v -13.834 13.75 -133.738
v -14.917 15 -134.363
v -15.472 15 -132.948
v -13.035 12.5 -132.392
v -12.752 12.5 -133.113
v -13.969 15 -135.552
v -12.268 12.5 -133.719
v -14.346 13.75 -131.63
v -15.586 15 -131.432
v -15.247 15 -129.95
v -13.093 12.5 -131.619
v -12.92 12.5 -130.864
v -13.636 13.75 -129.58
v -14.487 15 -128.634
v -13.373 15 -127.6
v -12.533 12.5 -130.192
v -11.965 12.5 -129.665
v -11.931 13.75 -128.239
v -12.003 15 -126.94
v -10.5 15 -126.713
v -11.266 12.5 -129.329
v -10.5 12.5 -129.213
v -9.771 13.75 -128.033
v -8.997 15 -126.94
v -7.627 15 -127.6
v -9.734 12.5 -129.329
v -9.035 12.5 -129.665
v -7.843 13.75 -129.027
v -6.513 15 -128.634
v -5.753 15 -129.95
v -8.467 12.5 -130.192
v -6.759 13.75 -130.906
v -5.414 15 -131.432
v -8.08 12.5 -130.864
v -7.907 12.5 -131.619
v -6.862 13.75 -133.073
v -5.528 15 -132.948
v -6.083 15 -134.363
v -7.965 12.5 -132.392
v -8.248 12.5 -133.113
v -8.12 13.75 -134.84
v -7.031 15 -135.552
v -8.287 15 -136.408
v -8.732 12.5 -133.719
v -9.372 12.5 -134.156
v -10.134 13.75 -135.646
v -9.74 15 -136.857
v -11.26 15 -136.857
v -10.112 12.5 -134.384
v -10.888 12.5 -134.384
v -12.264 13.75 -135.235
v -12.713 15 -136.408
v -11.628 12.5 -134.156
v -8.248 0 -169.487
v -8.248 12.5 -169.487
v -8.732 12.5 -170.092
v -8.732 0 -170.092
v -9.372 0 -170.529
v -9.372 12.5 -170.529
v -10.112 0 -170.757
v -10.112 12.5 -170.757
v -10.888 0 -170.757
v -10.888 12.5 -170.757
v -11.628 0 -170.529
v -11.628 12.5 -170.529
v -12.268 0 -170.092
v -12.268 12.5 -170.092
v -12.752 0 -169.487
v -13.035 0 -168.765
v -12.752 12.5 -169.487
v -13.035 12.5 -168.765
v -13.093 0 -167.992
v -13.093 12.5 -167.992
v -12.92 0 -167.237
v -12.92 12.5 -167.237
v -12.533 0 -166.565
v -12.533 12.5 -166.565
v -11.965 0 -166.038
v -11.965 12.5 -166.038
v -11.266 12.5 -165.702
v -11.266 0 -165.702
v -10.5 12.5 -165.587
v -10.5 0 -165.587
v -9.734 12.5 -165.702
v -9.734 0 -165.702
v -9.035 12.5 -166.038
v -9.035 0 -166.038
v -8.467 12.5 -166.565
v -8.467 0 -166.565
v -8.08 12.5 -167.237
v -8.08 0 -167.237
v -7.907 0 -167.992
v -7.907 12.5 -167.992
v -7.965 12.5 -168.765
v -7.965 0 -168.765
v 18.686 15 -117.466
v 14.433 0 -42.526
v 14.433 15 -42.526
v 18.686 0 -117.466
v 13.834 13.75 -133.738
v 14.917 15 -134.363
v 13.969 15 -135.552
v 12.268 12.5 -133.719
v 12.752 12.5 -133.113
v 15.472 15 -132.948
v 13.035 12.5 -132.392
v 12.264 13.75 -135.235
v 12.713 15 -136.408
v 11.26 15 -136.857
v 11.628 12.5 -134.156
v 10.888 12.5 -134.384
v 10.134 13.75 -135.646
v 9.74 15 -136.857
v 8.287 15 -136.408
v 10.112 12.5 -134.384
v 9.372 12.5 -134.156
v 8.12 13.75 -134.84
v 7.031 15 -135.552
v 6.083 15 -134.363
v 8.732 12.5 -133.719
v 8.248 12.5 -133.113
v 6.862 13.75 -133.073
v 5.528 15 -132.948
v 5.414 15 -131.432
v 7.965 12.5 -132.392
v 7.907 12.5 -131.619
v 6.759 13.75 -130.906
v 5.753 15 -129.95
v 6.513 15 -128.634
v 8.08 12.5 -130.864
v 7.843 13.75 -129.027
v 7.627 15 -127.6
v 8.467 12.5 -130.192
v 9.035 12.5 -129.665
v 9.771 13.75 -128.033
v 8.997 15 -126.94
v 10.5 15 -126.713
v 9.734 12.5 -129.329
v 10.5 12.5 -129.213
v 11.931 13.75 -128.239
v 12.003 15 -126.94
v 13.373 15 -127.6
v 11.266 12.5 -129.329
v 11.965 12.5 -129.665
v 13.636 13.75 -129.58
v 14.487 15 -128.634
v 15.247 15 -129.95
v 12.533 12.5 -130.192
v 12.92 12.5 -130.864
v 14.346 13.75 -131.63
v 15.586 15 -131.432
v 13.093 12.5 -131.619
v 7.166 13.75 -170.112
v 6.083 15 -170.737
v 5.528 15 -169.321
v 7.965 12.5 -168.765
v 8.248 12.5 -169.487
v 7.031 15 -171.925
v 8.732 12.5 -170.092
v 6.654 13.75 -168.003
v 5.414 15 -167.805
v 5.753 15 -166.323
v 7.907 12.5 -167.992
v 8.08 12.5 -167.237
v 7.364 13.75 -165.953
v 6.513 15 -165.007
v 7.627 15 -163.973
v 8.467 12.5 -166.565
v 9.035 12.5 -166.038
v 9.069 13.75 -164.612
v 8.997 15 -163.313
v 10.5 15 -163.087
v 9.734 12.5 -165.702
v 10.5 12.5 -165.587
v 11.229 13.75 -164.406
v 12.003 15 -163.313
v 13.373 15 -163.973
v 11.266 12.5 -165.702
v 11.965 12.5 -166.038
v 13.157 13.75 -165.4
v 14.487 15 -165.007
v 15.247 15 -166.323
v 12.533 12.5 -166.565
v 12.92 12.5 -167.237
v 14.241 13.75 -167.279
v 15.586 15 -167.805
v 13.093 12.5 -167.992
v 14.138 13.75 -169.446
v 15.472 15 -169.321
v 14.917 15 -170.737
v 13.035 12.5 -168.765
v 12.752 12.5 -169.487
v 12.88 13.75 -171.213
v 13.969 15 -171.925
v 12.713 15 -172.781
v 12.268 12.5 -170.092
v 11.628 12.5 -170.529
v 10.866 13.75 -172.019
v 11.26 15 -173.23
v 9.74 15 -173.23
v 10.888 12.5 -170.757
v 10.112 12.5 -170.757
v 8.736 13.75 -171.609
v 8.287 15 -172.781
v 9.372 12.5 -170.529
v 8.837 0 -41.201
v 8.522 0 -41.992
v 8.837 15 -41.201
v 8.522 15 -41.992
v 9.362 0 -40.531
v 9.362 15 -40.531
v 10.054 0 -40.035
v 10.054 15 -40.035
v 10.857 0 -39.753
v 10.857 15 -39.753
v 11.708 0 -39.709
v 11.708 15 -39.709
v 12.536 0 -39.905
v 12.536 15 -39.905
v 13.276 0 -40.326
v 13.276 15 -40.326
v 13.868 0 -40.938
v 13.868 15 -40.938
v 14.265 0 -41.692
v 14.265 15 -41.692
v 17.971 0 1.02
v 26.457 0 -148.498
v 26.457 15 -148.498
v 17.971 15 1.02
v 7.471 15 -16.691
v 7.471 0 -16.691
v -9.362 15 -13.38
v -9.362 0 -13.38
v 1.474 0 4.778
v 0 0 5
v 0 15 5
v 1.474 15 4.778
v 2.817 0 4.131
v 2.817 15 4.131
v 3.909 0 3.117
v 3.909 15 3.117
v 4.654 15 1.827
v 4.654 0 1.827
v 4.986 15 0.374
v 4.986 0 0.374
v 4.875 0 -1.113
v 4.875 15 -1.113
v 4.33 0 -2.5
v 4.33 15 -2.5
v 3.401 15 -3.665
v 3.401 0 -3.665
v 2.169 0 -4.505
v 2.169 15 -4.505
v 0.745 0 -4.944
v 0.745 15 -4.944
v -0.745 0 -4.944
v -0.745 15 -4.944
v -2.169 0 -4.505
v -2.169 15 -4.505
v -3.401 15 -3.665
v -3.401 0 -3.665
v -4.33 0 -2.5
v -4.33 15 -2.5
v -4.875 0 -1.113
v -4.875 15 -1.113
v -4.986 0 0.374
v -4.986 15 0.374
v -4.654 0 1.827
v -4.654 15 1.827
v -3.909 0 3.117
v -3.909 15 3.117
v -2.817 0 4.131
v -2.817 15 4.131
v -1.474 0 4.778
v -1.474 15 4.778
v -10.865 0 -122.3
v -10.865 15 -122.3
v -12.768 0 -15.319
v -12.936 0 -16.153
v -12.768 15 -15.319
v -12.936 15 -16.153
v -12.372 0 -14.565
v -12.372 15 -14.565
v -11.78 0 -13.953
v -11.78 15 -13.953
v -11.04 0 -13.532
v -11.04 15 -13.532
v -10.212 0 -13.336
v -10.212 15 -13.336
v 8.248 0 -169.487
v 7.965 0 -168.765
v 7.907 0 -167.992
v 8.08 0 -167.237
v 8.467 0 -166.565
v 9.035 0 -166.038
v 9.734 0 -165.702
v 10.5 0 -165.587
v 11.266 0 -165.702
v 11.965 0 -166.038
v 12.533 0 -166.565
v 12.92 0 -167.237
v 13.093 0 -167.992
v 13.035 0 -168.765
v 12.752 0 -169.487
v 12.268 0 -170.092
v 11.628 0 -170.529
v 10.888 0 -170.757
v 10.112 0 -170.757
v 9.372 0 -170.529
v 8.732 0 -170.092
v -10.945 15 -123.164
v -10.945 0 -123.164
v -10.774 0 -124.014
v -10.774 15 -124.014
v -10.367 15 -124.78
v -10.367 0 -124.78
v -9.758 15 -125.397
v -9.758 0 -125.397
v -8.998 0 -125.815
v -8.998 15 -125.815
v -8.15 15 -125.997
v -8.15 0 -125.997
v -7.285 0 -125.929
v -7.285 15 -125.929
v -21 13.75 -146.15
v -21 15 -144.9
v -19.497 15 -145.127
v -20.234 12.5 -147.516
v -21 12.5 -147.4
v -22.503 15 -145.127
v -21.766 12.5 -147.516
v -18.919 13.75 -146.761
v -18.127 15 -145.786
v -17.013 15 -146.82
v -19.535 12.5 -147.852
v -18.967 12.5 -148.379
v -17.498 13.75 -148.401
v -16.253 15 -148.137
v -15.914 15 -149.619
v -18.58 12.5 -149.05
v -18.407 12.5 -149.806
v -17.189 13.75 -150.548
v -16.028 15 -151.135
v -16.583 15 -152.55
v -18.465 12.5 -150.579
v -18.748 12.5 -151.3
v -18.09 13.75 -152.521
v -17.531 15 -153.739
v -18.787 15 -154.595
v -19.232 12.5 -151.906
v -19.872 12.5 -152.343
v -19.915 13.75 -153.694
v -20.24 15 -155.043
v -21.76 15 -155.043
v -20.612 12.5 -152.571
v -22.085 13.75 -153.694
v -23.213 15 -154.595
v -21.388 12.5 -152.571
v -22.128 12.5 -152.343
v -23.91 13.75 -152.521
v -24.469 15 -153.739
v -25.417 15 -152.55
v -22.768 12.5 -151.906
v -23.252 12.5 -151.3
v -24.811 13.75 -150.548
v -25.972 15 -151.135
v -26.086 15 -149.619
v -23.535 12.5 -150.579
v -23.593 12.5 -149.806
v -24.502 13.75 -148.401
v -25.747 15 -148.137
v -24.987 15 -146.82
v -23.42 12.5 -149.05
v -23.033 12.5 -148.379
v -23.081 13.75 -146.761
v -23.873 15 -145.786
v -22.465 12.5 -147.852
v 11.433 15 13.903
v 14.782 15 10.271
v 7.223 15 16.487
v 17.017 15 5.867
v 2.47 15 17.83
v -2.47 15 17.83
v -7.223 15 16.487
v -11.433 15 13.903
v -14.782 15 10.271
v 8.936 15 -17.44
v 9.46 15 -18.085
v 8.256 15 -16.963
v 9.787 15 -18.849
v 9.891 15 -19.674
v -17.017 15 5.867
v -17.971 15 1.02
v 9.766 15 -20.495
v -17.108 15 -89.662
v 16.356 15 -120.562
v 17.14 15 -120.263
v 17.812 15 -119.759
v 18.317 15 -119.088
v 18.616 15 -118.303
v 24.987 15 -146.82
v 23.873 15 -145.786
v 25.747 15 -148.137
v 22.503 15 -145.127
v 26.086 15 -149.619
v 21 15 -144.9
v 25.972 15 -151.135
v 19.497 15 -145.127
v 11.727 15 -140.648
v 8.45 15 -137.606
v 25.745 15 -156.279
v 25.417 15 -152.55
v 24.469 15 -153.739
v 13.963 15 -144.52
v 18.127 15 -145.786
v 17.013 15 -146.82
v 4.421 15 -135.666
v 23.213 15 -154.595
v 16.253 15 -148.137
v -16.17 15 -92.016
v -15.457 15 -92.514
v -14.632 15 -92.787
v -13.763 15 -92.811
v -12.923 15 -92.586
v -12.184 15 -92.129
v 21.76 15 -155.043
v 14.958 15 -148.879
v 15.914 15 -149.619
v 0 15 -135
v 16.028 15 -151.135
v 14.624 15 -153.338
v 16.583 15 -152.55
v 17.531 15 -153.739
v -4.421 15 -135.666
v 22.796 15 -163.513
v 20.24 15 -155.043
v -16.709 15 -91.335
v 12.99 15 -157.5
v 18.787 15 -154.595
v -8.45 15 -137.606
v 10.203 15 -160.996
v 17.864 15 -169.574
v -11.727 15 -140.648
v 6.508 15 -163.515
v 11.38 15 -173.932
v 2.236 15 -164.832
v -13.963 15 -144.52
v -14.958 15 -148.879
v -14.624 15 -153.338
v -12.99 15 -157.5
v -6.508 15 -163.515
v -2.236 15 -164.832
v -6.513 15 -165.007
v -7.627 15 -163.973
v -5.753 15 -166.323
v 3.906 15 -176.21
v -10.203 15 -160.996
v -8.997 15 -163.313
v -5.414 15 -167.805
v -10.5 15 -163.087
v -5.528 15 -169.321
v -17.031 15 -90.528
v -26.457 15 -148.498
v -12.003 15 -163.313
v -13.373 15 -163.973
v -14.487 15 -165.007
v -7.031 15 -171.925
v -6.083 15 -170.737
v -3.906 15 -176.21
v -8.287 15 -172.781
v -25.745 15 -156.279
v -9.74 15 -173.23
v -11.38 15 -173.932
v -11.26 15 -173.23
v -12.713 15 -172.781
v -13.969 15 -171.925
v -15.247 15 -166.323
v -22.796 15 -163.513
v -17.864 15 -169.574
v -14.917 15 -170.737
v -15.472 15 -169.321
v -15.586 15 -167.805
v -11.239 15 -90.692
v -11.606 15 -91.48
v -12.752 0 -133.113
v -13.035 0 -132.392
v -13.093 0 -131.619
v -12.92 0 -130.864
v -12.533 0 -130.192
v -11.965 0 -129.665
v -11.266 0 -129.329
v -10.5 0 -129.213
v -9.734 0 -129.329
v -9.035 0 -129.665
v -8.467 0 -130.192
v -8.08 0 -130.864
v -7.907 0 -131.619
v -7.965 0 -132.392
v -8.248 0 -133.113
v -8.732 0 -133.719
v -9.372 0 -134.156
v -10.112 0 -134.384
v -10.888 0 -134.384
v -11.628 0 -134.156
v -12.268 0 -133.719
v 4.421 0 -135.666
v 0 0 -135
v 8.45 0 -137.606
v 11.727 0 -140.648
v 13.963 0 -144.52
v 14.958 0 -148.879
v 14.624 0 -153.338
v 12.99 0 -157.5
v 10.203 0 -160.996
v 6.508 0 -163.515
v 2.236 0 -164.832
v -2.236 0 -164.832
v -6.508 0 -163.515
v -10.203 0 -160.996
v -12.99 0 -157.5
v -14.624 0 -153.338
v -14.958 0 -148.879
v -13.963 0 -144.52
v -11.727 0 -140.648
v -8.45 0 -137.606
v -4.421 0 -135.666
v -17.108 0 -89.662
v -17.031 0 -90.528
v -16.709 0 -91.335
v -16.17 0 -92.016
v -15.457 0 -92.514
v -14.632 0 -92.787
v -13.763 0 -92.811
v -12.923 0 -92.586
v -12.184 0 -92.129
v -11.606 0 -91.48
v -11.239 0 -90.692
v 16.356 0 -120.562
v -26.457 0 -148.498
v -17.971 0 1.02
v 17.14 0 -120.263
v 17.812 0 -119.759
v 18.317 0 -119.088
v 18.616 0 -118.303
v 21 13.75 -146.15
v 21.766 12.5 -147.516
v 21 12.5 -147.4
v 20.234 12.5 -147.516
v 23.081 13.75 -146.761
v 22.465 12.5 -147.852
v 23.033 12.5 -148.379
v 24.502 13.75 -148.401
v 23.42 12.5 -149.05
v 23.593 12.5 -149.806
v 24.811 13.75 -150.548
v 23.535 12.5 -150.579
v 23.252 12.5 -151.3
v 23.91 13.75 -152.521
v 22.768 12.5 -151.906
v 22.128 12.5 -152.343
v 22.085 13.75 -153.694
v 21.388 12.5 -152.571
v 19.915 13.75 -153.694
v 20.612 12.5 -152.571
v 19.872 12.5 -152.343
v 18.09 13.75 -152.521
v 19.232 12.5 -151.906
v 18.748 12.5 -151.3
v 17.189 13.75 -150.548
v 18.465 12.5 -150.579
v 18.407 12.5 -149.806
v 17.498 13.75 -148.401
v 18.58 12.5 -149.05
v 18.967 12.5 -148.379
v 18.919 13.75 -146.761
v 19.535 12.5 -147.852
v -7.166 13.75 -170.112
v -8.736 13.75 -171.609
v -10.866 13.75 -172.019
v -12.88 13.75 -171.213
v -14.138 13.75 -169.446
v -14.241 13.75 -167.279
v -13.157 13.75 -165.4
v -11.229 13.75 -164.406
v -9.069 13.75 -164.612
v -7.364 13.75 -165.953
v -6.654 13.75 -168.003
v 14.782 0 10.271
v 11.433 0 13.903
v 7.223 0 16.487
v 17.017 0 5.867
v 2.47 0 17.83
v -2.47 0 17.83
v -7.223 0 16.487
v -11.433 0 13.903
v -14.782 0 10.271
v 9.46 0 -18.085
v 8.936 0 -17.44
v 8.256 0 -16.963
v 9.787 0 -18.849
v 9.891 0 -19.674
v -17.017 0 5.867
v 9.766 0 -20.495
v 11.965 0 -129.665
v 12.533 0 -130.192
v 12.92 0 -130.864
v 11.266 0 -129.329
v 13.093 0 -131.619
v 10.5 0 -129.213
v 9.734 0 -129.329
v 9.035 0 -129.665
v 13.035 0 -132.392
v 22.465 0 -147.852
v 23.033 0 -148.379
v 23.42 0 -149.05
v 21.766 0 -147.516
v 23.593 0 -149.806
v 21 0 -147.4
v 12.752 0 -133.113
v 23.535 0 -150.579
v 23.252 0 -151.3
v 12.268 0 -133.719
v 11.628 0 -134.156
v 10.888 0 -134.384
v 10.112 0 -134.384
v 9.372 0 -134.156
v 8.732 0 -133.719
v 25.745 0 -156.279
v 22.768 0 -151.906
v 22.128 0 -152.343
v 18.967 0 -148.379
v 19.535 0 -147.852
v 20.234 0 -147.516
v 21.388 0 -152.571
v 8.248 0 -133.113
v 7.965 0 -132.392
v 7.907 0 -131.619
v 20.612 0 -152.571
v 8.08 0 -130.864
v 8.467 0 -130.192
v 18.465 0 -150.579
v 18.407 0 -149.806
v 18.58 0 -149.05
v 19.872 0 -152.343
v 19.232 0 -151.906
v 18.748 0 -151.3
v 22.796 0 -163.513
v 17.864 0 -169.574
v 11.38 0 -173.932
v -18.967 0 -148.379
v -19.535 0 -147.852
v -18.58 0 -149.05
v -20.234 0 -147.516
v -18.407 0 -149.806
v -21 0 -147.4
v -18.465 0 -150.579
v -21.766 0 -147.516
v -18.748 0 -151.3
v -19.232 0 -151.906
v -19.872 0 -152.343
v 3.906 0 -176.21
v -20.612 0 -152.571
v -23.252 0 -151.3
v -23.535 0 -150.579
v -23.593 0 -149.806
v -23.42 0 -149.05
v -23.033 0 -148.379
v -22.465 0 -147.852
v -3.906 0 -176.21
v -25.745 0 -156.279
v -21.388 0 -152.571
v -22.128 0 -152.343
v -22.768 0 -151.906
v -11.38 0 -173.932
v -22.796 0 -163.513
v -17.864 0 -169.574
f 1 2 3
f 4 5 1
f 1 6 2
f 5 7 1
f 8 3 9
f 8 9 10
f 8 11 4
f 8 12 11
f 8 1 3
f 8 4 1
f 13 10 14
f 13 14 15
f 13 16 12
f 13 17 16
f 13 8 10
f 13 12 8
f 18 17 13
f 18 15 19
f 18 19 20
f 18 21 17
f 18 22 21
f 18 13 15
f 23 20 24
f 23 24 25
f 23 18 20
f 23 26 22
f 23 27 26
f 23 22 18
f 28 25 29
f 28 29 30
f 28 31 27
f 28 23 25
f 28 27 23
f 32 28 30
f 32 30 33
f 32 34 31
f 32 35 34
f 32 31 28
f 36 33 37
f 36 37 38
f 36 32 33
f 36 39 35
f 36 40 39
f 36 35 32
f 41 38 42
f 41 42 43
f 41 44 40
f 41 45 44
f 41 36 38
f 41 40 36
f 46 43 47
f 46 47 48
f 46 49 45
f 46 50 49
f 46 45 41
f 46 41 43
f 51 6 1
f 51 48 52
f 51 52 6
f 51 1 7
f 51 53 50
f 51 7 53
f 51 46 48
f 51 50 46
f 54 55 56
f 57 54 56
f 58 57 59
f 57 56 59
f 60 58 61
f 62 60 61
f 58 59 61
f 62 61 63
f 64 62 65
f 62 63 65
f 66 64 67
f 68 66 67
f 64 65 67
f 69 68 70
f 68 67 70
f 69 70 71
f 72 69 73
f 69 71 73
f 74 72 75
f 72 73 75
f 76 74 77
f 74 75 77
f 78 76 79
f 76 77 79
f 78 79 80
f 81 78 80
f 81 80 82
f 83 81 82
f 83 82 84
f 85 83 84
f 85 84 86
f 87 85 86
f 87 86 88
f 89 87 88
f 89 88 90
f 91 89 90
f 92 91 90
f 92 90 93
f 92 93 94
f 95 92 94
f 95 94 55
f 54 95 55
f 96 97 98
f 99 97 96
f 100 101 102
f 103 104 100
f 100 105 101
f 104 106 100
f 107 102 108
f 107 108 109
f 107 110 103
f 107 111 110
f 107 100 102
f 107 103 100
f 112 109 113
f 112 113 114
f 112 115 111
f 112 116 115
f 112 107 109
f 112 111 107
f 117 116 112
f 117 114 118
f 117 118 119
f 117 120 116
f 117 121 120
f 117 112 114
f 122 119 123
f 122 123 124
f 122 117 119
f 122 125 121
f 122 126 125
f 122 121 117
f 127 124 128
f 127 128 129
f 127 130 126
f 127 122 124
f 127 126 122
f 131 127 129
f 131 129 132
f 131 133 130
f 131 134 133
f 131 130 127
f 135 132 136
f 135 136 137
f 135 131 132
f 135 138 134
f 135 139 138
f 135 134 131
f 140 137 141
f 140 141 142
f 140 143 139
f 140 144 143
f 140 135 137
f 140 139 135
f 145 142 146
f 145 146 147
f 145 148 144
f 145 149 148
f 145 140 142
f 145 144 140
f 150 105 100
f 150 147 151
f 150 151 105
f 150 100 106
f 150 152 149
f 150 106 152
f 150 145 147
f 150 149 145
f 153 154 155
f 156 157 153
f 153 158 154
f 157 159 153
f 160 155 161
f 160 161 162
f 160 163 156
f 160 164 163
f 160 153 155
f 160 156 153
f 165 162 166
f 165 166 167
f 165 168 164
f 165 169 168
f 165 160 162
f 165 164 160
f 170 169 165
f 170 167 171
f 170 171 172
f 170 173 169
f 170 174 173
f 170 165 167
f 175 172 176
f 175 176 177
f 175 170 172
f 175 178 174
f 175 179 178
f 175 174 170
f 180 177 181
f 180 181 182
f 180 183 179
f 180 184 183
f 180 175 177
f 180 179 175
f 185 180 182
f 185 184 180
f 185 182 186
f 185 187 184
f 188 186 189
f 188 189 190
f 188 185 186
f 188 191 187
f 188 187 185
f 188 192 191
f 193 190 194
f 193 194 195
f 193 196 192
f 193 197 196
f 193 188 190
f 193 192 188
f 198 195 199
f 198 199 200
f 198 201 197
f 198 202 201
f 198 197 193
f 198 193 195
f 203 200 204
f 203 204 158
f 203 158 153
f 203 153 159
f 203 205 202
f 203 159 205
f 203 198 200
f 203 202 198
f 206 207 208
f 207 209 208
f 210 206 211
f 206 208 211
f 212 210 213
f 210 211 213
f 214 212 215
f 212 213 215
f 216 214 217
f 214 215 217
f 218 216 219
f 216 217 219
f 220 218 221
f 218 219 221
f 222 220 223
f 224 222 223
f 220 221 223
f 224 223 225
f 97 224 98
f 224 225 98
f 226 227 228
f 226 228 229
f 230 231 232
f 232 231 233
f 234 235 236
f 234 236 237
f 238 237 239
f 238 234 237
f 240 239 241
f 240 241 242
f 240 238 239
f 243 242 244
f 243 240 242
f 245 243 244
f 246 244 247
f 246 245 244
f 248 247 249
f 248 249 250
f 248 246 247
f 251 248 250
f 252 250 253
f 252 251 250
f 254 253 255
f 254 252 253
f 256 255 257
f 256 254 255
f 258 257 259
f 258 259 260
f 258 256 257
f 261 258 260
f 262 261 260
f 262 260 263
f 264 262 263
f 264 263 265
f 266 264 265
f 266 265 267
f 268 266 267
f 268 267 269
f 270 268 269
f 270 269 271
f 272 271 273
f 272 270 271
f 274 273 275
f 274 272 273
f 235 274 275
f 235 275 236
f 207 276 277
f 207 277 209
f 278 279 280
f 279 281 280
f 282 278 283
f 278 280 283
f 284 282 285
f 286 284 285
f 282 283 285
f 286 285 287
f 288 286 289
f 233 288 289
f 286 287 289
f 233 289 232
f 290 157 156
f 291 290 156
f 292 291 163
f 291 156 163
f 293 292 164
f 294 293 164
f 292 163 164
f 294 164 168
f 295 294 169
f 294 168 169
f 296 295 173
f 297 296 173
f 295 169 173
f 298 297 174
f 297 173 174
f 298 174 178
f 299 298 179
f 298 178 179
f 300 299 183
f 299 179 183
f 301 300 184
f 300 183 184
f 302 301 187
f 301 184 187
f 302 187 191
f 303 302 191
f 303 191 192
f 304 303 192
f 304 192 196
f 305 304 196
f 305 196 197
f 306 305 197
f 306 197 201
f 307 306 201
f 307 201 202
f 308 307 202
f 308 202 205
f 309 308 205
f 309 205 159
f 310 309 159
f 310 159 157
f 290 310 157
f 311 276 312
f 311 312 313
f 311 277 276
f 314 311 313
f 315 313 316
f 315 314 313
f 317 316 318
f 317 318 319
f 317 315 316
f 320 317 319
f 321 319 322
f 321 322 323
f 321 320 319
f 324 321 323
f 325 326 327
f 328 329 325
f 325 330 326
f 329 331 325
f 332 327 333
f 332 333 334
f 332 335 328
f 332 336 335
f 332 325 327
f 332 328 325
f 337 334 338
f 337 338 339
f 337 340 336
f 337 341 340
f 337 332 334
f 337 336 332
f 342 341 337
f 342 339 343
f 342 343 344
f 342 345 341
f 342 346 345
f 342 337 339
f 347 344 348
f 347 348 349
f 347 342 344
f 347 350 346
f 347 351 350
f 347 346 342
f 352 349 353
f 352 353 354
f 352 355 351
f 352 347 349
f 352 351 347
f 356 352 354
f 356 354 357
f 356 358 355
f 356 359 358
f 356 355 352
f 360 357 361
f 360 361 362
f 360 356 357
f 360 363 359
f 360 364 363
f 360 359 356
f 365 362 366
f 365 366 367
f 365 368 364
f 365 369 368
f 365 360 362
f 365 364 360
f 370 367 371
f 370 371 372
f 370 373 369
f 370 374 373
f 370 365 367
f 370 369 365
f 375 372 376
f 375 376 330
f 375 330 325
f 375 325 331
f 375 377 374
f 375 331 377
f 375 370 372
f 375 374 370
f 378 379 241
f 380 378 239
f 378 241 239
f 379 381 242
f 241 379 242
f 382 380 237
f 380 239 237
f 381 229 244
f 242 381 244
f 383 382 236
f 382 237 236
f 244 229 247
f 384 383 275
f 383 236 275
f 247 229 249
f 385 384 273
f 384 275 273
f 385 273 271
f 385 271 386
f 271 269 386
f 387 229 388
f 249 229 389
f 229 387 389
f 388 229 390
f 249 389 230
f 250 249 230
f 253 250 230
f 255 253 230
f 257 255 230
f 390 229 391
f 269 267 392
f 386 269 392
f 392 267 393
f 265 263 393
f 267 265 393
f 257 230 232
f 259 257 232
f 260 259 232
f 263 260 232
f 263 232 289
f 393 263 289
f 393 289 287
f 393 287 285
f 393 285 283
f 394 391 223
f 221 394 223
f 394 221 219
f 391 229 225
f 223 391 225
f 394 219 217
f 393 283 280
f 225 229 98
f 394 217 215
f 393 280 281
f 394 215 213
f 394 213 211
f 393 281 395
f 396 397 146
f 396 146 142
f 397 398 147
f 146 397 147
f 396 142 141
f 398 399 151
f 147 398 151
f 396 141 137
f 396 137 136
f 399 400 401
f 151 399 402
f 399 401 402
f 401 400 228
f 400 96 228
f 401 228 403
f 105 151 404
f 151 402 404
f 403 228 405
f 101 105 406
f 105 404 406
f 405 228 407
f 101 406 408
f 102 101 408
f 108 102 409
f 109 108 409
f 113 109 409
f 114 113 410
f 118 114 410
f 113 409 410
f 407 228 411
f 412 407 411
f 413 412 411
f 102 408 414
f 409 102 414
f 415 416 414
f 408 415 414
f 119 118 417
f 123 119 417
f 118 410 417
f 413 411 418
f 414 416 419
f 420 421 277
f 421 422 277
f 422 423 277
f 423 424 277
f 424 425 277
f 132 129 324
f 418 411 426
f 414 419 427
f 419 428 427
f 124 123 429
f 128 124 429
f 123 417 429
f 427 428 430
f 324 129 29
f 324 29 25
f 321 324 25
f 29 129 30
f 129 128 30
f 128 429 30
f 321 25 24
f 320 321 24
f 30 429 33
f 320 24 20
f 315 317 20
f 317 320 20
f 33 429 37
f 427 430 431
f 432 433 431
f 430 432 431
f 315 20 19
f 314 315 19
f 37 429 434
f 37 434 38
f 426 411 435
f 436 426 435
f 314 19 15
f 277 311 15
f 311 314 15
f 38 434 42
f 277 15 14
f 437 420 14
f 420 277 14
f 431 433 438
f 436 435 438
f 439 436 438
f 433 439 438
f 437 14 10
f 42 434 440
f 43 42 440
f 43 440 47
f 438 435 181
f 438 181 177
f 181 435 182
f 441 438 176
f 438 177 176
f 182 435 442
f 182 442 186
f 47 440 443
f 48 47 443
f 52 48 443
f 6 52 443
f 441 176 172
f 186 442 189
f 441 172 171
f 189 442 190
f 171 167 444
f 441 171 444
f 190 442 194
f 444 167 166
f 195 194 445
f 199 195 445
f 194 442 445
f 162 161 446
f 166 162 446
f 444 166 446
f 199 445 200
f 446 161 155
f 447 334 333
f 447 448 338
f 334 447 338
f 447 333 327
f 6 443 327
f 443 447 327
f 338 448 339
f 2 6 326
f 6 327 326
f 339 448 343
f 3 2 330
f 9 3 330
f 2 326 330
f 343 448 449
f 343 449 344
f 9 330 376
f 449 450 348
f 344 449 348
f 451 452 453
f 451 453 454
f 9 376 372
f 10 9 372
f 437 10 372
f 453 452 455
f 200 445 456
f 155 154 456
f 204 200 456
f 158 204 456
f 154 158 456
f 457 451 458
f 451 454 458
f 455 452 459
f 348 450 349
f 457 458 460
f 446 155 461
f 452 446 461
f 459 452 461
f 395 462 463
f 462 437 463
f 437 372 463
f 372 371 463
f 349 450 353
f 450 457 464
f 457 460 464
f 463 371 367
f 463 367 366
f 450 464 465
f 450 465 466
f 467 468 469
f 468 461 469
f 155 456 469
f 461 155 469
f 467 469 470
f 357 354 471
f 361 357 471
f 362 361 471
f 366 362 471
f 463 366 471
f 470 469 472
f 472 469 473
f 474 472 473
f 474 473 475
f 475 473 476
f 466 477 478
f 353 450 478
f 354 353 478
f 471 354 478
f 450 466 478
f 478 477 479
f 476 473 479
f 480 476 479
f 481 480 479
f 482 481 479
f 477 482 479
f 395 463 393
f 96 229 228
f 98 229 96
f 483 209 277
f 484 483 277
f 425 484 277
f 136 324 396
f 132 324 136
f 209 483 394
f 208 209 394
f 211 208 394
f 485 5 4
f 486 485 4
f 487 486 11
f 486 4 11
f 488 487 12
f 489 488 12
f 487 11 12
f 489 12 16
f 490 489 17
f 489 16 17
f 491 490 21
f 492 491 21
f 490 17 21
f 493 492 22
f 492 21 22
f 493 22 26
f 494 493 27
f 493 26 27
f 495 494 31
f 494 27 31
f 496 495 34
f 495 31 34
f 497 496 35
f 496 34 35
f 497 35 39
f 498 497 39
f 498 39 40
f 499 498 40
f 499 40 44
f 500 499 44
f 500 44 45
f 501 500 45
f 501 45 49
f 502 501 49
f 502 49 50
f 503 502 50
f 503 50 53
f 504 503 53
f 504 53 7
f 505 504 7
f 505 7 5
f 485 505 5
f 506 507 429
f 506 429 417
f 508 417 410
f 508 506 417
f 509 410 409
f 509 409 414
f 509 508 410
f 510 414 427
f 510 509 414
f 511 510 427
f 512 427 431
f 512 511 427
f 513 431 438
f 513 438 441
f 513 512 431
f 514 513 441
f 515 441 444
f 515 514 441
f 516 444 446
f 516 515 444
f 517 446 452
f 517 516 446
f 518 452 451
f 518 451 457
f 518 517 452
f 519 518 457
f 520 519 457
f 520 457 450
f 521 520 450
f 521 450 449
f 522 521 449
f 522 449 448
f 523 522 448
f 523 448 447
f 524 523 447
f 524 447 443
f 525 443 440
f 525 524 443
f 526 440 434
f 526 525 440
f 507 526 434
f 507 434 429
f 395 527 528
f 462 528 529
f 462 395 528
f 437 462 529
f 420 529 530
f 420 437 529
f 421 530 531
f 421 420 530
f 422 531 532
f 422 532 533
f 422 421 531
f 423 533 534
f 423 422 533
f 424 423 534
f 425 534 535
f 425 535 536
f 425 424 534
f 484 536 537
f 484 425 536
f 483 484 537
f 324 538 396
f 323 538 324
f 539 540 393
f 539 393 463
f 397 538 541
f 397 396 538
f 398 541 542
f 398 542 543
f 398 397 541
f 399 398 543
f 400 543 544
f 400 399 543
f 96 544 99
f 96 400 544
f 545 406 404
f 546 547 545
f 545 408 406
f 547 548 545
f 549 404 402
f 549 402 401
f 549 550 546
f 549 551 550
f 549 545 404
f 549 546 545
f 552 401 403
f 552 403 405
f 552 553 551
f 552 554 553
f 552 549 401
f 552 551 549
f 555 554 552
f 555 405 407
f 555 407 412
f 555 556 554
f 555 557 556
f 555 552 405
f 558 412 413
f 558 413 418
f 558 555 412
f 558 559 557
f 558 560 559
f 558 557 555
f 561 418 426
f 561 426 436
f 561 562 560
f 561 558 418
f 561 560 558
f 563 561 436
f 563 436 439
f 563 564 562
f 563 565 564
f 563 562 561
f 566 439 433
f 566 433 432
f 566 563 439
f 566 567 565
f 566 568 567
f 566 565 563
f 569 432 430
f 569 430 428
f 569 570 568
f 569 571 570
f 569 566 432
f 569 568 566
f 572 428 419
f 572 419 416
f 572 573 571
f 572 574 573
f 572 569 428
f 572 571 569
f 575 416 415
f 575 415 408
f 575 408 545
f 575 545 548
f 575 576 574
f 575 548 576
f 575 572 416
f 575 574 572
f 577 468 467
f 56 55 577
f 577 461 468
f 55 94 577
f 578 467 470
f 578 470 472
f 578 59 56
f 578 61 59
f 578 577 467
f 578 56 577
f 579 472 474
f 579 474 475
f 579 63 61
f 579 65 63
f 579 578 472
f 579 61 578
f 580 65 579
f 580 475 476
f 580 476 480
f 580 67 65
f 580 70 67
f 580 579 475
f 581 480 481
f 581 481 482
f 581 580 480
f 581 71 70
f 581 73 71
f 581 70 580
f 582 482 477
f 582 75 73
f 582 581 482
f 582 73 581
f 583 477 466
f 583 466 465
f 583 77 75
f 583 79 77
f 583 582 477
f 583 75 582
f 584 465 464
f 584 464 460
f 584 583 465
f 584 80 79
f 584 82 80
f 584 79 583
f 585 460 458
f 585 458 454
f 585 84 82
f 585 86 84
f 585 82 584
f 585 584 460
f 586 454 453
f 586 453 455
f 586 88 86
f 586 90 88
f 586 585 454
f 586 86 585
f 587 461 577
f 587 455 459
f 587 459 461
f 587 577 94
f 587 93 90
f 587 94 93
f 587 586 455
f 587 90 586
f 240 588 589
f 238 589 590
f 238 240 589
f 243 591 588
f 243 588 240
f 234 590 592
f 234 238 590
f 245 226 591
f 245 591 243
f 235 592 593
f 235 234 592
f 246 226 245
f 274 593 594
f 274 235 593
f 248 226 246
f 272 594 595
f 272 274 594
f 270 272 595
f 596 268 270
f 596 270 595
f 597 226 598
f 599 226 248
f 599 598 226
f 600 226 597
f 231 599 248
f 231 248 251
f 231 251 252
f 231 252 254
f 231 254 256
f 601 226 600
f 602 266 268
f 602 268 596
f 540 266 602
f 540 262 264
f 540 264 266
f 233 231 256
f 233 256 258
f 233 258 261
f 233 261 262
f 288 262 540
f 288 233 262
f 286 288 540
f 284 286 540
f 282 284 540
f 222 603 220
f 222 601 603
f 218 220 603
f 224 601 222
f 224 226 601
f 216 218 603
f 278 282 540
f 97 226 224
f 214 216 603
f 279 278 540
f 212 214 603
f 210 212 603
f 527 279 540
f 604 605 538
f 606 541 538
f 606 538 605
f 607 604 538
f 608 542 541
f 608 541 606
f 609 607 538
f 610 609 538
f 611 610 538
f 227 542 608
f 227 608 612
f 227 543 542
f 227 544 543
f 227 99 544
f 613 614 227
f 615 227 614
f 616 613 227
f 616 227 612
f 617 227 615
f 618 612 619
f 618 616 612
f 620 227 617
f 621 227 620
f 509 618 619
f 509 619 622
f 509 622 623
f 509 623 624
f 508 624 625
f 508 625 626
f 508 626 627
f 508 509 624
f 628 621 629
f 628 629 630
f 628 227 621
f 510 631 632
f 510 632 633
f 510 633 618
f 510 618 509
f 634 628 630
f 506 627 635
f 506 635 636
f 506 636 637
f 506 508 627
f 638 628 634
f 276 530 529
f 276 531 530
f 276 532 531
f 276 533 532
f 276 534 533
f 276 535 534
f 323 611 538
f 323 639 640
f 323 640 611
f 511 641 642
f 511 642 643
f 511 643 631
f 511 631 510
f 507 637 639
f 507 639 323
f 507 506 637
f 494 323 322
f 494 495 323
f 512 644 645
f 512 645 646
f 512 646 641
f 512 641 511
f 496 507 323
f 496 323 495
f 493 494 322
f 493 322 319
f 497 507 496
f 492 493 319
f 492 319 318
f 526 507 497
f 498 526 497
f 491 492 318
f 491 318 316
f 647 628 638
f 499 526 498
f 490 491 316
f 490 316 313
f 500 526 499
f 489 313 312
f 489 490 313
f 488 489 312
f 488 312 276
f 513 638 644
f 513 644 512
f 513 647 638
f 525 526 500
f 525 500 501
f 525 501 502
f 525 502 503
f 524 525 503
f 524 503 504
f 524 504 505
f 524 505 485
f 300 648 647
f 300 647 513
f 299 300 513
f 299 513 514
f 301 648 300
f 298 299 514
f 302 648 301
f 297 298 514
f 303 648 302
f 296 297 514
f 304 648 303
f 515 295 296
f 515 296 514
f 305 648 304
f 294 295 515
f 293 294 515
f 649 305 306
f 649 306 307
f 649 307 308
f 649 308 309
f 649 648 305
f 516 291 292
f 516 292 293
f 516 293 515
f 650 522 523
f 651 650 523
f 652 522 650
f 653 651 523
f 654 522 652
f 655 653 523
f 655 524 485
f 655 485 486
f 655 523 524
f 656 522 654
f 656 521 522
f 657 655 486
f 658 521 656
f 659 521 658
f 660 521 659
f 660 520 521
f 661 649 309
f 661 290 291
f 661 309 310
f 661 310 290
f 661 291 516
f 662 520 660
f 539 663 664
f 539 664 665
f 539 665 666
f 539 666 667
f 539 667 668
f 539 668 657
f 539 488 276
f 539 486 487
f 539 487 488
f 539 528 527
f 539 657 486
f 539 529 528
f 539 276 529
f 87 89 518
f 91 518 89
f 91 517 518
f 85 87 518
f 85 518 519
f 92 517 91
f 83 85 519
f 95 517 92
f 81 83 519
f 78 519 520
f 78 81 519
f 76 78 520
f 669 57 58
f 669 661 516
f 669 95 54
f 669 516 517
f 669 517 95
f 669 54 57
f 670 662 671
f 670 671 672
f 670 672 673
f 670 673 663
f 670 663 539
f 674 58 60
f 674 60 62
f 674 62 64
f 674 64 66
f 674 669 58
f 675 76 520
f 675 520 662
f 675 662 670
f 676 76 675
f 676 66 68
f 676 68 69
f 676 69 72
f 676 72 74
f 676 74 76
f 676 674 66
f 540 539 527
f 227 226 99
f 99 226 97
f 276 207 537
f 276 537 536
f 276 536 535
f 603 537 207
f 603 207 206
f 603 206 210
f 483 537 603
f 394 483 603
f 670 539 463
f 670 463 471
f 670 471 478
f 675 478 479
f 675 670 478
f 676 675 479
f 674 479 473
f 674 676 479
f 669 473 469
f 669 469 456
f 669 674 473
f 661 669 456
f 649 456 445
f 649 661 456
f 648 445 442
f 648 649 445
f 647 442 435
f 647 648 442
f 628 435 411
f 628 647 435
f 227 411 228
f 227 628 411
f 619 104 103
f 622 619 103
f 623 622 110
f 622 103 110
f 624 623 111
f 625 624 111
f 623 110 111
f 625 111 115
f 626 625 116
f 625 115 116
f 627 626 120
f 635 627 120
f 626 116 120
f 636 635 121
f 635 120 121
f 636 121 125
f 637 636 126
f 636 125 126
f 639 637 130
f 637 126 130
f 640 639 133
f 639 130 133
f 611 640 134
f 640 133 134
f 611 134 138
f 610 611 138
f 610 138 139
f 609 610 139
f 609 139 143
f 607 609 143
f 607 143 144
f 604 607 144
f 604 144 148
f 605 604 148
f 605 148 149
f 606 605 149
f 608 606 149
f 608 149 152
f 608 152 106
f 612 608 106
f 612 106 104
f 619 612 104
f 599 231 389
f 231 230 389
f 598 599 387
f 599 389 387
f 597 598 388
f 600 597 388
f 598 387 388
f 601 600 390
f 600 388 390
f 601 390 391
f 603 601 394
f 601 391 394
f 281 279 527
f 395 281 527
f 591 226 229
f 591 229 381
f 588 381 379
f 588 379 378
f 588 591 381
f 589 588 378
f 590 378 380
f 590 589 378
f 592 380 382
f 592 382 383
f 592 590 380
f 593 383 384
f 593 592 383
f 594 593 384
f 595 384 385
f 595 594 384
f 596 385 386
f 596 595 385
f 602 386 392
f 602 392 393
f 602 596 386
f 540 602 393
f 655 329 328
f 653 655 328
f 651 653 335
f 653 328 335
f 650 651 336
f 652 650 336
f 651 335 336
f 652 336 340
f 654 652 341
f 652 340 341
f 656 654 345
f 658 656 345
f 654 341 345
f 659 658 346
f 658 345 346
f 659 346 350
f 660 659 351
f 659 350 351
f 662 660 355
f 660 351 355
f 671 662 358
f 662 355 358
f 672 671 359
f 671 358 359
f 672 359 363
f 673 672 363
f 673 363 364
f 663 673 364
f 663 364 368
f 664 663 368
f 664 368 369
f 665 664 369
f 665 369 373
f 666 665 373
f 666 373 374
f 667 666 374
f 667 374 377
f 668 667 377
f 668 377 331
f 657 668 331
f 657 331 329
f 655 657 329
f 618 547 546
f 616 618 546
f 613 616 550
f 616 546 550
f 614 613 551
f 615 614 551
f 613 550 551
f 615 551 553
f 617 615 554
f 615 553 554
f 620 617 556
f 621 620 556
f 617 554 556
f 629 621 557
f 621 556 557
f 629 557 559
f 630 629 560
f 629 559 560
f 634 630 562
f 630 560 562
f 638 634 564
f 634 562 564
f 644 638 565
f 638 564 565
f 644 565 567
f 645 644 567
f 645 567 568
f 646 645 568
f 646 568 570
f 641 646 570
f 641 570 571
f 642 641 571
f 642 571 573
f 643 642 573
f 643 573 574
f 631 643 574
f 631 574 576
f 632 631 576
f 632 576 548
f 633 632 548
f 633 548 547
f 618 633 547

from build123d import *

# Parameters (mm, degrees)
SKETCH_1_R               = 5
SKETCH_1_R_2             = 15
EXTRUDE_1_DEPTH          = 15
FILLET_1_R               = 3
SKETCH_2_R               = 2.6
CUT_EXTRUDE_1_DEPTH      = 180.107509614
PATTERN_CIRCULAR_5_COUNT = 3
CHAMFER_1_SIZE           = 2.5


with BuildPart() as part:
    # 草图1 → 凸台-拉伸1 (new body)
    with BuildSketch(Plane(origin=(0, 0, 0), x_dir=(1, 0, 0), z_dir=(0, 1, 0))):
        with BuildLine():
            Line((-17.971076762, -1.02), (-26.457418567, 148.498333333))
            ThreePointArc((-26.457418567, 148.498333333), (0, 176.5), (26.457418567, 148.498333333))
            Line((26.457418567, 148.498333333), (17.971076762, -1.02))
            ThreePointArc((17.971076762, -1.02), (0, -18), (-17.971076762, -1.02))
        make_face()
        with Locations(Location((0, 0, 0), (0, 0, 270))):
            Circle(SKETCH_1_R, mode=Mode.SUBTRACT)
        with Locations(Location((0, 150, 0), (0, 0, 270))):
            Circle(SKETCH_1_R_2, mode=Mode.SUBTRACT)
        Polygon((-12.740980954, 12.714849757), (-18.554385191, 115.139490738), (10.712851955, 17.329399023), align=None, mode=Mode.SUBTRACT)
        Polygon((13.283215706, 22.268322657), (18.830257334, 120), (-12, 127), align=None, mode=Mode.SUBTRACT)
    extrude(amount=EXTRUDE_1_DEPTH)

    # 圆角1
    fillet_1_edges = [part.edges().sort_by_distance(p)[0] for p in [
        (-12.740980954, 7.5, -12.714849757),
        (10.712851955, 7.5, -17.329399023),
        (-18.554385191, 7.5, -115.139490738),
        (18.830257334, 7.5, -120),
        (-12, 7.5, -127),
        (13.283215706, 7.5, -22.268322657),
    ]]
    fillet(fillet_1_edges, radius=FILLET_1_R)

    # 草图2 → 切除-拉伸1 (cut, through all)
    with BuildSketch(Plane(origin=(0, 15, 0), x_dir=(1, 0, 0), z_dir=(0, 1, 0))):
        with Locations(Location((-21, 150, 0), (0, 0, 270))):
            Circle(SKETCH_2_R)
        with Locations(Location((21, 150, 0), (0, 0, 270))):
            Circle(SKETCH_2_R)
    cut_extrude_1 = extrude(amount=-CUT_EXTRUDE_1_DEPTH, mode=Mode.SUBTRACT)

    # 阵列(圆周)5: 切除-拉伸1 ×3 about axis
    pattern_circular_5_axis = Axis((0, 0, -150), (0, 1, 0))
    for i in range(1, PATTERN_CIRCULAR_5_COUNT):
        add(cut_extrude_1.rotate(pattern_circular_5_axis, i * 360 / PATTERN_CIRCULAR_5_COUNT), mode=Mode.SUBTRACT)

    # 倒角1
    chamfer_1_edges = [part.edges().sort_by_distance(p)[0] for p in [
        (-12.75166605, 15, -166.886533479),
        (-8.24833395, 15, -130.513466521),
        (-21, 15, -152.6),
        (21, 15, -152.6),
        (8.24833395, 15, -130.513466521),
        (12.75166605, 15, -166.886533479),
    ]]
    chamfer(chamfer_1_edges, length=CHAMFER_1_SIZE)


solid = part.part
